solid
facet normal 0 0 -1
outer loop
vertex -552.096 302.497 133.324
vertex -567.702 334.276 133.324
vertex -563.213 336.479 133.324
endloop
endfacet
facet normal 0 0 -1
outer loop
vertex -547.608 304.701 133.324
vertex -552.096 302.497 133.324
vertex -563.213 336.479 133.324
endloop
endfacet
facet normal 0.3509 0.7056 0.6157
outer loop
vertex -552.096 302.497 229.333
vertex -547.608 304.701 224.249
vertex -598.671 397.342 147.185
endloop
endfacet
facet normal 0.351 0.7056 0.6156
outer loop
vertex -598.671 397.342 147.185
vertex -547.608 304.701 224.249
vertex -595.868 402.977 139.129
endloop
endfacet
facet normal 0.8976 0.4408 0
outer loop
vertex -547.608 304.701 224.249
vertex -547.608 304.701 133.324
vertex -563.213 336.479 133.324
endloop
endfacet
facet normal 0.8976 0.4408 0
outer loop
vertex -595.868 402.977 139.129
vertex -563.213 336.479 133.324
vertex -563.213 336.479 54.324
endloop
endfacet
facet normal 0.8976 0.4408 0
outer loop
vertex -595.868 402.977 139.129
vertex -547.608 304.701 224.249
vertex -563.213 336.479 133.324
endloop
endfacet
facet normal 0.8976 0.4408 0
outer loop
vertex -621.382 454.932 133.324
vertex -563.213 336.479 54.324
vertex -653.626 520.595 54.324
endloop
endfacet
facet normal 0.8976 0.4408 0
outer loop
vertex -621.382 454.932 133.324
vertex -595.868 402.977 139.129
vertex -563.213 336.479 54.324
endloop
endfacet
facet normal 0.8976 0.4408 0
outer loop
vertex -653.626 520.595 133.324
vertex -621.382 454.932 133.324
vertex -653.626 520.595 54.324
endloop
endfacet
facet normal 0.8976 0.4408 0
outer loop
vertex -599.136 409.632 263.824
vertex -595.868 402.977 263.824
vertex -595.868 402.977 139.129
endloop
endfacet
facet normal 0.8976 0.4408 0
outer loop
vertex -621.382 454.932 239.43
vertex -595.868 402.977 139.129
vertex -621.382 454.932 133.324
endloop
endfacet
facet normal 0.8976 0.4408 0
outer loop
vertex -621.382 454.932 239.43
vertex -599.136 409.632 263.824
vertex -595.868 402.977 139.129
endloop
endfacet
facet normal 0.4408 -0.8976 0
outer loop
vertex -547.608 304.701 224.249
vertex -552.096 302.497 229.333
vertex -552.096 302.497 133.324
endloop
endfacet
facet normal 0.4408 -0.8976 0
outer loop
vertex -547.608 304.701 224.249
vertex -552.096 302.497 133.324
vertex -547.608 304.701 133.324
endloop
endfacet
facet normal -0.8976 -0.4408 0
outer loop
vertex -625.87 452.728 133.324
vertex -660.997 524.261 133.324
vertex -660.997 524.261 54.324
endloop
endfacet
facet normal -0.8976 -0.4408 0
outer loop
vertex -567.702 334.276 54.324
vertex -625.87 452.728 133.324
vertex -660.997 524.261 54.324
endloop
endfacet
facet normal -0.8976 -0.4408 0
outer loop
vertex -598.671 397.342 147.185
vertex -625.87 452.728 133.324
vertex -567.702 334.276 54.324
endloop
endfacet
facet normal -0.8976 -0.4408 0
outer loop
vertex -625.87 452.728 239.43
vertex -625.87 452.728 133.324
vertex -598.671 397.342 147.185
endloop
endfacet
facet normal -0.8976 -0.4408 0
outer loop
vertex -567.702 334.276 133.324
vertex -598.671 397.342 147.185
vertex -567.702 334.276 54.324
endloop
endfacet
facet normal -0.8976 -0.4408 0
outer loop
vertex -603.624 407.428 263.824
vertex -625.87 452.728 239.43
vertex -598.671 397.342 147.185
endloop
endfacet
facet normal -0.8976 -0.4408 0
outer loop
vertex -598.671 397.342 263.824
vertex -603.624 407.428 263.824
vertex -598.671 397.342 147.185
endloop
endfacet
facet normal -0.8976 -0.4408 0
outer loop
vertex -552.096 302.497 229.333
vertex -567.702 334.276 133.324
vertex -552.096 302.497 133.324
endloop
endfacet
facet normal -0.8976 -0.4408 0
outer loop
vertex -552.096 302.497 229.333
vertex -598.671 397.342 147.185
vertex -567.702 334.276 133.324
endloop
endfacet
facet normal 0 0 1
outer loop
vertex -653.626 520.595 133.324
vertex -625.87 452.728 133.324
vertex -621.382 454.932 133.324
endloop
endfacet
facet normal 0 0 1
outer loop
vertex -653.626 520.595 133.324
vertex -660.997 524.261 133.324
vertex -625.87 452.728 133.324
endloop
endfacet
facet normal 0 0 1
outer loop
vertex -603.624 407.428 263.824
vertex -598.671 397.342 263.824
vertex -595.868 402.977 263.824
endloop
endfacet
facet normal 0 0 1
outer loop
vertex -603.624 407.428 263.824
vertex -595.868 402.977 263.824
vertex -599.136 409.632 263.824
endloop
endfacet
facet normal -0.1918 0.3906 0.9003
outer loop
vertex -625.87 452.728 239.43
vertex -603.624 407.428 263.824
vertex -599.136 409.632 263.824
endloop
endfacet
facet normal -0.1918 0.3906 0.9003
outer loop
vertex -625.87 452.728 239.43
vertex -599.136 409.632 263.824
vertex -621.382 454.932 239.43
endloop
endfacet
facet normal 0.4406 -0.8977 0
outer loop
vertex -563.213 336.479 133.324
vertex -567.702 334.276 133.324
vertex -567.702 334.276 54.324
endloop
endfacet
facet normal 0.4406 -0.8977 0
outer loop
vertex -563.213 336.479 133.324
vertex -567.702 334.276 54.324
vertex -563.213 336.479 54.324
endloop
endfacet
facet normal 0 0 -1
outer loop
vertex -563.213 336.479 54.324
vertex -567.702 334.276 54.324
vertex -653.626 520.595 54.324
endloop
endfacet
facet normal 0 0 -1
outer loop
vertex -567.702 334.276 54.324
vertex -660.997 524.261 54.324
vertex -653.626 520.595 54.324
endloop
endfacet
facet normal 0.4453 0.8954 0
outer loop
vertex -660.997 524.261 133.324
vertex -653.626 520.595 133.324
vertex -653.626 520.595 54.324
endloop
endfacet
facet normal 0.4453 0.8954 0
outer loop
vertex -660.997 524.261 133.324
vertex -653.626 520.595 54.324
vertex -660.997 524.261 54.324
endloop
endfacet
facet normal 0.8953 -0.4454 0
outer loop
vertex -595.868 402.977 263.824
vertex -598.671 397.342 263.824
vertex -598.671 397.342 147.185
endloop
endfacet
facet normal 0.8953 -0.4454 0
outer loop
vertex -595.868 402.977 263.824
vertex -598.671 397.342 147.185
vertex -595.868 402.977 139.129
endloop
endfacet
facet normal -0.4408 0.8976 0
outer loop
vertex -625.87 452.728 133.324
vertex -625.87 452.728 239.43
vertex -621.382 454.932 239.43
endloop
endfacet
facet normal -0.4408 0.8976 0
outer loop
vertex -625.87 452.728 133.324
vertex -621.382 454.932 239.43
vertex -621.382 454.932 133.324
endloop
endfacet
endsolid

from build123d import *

# Parameters (mm, degrees)
BOSS_EXTRUDE1_DEPTH = 208.295834
CUT_EXTRUDE1_DEPTH  = 233.9651465
CUT_EXTRUDE3_DEPTH  = 106.39675924
BOSS_EXTRUDE2_DEPTH = 79


with BuildPart() as part:
    # Sketch2 → Boss-Extrude1 (new body)
    with BuildSketch(Plane.XY.offset(133.323635178)):
        Polygon((-552.096326618, 302.497295421), (-547.608266937, 304.701228339), (-659.457001573, 532.468503885), (-662.259879772, 526.832889814), align=None)
    extrude(amount=BOSS_EXTRUDE1_DEPTH)

    # Sketch3 → Cut-Extrude1 (cut, through all)
    with BuildSketch(Plane(origin=(56.456528708, 113.514460847, 99.05047984), x_dir=(-0.935748975, 0.239556806, 0.258817295), z_dir=(-0.350913088, -0.705564279, -0.615661475))):
        Polygon((641.877398582, 324.891396181), (520.568005211, 262.71812893), (690.075774021, -224.74438404), (811.385167392, -162.571116789), align=None)
    extrude(amount=-CUT_EXTRUDE1_DEPTH, mode=Mode.SUBTRACT)

    # Sketch5 → Cut-Extrude3 (cut, through all)
    with BuildSketch(Plane(origin=(-325.143320908, -159.666786774, 0), x_dir=(0, 0, 1), z_dir=(-0.897611936, -0.440786584, 0))):
        Polygon((263.823635178, 620.544936833), (263.823635178, 631.781992675), (239.430319814, 682.249402309), (133.323635178, 682.249402309), (133.323635178, 768.6298834), (341.619468978, 768.6298834), (341.619468978, 620.544936833), align=None)
    extrude(amount=-CUT_EXTRUDE3_DEPTH, mode=Mode.SUBTRACT)

    # Sketch6 → Boss-Extrude2 (add)
    with BuildSketch(Plane(origin=(0, 0, 133.323635178), x_dir=(-1, 0, 0), z_dir=(0, 0, -1))):
        Polygon((567.701533334, 334.275530817), (563.213473653, 336.479463735), (653.626470855, 520.595288681), (660.996902767, 524.260980239), align=None)
    extrude(amount=BOSS_EXTRUDE2_DEPTH)


solid = part.part
